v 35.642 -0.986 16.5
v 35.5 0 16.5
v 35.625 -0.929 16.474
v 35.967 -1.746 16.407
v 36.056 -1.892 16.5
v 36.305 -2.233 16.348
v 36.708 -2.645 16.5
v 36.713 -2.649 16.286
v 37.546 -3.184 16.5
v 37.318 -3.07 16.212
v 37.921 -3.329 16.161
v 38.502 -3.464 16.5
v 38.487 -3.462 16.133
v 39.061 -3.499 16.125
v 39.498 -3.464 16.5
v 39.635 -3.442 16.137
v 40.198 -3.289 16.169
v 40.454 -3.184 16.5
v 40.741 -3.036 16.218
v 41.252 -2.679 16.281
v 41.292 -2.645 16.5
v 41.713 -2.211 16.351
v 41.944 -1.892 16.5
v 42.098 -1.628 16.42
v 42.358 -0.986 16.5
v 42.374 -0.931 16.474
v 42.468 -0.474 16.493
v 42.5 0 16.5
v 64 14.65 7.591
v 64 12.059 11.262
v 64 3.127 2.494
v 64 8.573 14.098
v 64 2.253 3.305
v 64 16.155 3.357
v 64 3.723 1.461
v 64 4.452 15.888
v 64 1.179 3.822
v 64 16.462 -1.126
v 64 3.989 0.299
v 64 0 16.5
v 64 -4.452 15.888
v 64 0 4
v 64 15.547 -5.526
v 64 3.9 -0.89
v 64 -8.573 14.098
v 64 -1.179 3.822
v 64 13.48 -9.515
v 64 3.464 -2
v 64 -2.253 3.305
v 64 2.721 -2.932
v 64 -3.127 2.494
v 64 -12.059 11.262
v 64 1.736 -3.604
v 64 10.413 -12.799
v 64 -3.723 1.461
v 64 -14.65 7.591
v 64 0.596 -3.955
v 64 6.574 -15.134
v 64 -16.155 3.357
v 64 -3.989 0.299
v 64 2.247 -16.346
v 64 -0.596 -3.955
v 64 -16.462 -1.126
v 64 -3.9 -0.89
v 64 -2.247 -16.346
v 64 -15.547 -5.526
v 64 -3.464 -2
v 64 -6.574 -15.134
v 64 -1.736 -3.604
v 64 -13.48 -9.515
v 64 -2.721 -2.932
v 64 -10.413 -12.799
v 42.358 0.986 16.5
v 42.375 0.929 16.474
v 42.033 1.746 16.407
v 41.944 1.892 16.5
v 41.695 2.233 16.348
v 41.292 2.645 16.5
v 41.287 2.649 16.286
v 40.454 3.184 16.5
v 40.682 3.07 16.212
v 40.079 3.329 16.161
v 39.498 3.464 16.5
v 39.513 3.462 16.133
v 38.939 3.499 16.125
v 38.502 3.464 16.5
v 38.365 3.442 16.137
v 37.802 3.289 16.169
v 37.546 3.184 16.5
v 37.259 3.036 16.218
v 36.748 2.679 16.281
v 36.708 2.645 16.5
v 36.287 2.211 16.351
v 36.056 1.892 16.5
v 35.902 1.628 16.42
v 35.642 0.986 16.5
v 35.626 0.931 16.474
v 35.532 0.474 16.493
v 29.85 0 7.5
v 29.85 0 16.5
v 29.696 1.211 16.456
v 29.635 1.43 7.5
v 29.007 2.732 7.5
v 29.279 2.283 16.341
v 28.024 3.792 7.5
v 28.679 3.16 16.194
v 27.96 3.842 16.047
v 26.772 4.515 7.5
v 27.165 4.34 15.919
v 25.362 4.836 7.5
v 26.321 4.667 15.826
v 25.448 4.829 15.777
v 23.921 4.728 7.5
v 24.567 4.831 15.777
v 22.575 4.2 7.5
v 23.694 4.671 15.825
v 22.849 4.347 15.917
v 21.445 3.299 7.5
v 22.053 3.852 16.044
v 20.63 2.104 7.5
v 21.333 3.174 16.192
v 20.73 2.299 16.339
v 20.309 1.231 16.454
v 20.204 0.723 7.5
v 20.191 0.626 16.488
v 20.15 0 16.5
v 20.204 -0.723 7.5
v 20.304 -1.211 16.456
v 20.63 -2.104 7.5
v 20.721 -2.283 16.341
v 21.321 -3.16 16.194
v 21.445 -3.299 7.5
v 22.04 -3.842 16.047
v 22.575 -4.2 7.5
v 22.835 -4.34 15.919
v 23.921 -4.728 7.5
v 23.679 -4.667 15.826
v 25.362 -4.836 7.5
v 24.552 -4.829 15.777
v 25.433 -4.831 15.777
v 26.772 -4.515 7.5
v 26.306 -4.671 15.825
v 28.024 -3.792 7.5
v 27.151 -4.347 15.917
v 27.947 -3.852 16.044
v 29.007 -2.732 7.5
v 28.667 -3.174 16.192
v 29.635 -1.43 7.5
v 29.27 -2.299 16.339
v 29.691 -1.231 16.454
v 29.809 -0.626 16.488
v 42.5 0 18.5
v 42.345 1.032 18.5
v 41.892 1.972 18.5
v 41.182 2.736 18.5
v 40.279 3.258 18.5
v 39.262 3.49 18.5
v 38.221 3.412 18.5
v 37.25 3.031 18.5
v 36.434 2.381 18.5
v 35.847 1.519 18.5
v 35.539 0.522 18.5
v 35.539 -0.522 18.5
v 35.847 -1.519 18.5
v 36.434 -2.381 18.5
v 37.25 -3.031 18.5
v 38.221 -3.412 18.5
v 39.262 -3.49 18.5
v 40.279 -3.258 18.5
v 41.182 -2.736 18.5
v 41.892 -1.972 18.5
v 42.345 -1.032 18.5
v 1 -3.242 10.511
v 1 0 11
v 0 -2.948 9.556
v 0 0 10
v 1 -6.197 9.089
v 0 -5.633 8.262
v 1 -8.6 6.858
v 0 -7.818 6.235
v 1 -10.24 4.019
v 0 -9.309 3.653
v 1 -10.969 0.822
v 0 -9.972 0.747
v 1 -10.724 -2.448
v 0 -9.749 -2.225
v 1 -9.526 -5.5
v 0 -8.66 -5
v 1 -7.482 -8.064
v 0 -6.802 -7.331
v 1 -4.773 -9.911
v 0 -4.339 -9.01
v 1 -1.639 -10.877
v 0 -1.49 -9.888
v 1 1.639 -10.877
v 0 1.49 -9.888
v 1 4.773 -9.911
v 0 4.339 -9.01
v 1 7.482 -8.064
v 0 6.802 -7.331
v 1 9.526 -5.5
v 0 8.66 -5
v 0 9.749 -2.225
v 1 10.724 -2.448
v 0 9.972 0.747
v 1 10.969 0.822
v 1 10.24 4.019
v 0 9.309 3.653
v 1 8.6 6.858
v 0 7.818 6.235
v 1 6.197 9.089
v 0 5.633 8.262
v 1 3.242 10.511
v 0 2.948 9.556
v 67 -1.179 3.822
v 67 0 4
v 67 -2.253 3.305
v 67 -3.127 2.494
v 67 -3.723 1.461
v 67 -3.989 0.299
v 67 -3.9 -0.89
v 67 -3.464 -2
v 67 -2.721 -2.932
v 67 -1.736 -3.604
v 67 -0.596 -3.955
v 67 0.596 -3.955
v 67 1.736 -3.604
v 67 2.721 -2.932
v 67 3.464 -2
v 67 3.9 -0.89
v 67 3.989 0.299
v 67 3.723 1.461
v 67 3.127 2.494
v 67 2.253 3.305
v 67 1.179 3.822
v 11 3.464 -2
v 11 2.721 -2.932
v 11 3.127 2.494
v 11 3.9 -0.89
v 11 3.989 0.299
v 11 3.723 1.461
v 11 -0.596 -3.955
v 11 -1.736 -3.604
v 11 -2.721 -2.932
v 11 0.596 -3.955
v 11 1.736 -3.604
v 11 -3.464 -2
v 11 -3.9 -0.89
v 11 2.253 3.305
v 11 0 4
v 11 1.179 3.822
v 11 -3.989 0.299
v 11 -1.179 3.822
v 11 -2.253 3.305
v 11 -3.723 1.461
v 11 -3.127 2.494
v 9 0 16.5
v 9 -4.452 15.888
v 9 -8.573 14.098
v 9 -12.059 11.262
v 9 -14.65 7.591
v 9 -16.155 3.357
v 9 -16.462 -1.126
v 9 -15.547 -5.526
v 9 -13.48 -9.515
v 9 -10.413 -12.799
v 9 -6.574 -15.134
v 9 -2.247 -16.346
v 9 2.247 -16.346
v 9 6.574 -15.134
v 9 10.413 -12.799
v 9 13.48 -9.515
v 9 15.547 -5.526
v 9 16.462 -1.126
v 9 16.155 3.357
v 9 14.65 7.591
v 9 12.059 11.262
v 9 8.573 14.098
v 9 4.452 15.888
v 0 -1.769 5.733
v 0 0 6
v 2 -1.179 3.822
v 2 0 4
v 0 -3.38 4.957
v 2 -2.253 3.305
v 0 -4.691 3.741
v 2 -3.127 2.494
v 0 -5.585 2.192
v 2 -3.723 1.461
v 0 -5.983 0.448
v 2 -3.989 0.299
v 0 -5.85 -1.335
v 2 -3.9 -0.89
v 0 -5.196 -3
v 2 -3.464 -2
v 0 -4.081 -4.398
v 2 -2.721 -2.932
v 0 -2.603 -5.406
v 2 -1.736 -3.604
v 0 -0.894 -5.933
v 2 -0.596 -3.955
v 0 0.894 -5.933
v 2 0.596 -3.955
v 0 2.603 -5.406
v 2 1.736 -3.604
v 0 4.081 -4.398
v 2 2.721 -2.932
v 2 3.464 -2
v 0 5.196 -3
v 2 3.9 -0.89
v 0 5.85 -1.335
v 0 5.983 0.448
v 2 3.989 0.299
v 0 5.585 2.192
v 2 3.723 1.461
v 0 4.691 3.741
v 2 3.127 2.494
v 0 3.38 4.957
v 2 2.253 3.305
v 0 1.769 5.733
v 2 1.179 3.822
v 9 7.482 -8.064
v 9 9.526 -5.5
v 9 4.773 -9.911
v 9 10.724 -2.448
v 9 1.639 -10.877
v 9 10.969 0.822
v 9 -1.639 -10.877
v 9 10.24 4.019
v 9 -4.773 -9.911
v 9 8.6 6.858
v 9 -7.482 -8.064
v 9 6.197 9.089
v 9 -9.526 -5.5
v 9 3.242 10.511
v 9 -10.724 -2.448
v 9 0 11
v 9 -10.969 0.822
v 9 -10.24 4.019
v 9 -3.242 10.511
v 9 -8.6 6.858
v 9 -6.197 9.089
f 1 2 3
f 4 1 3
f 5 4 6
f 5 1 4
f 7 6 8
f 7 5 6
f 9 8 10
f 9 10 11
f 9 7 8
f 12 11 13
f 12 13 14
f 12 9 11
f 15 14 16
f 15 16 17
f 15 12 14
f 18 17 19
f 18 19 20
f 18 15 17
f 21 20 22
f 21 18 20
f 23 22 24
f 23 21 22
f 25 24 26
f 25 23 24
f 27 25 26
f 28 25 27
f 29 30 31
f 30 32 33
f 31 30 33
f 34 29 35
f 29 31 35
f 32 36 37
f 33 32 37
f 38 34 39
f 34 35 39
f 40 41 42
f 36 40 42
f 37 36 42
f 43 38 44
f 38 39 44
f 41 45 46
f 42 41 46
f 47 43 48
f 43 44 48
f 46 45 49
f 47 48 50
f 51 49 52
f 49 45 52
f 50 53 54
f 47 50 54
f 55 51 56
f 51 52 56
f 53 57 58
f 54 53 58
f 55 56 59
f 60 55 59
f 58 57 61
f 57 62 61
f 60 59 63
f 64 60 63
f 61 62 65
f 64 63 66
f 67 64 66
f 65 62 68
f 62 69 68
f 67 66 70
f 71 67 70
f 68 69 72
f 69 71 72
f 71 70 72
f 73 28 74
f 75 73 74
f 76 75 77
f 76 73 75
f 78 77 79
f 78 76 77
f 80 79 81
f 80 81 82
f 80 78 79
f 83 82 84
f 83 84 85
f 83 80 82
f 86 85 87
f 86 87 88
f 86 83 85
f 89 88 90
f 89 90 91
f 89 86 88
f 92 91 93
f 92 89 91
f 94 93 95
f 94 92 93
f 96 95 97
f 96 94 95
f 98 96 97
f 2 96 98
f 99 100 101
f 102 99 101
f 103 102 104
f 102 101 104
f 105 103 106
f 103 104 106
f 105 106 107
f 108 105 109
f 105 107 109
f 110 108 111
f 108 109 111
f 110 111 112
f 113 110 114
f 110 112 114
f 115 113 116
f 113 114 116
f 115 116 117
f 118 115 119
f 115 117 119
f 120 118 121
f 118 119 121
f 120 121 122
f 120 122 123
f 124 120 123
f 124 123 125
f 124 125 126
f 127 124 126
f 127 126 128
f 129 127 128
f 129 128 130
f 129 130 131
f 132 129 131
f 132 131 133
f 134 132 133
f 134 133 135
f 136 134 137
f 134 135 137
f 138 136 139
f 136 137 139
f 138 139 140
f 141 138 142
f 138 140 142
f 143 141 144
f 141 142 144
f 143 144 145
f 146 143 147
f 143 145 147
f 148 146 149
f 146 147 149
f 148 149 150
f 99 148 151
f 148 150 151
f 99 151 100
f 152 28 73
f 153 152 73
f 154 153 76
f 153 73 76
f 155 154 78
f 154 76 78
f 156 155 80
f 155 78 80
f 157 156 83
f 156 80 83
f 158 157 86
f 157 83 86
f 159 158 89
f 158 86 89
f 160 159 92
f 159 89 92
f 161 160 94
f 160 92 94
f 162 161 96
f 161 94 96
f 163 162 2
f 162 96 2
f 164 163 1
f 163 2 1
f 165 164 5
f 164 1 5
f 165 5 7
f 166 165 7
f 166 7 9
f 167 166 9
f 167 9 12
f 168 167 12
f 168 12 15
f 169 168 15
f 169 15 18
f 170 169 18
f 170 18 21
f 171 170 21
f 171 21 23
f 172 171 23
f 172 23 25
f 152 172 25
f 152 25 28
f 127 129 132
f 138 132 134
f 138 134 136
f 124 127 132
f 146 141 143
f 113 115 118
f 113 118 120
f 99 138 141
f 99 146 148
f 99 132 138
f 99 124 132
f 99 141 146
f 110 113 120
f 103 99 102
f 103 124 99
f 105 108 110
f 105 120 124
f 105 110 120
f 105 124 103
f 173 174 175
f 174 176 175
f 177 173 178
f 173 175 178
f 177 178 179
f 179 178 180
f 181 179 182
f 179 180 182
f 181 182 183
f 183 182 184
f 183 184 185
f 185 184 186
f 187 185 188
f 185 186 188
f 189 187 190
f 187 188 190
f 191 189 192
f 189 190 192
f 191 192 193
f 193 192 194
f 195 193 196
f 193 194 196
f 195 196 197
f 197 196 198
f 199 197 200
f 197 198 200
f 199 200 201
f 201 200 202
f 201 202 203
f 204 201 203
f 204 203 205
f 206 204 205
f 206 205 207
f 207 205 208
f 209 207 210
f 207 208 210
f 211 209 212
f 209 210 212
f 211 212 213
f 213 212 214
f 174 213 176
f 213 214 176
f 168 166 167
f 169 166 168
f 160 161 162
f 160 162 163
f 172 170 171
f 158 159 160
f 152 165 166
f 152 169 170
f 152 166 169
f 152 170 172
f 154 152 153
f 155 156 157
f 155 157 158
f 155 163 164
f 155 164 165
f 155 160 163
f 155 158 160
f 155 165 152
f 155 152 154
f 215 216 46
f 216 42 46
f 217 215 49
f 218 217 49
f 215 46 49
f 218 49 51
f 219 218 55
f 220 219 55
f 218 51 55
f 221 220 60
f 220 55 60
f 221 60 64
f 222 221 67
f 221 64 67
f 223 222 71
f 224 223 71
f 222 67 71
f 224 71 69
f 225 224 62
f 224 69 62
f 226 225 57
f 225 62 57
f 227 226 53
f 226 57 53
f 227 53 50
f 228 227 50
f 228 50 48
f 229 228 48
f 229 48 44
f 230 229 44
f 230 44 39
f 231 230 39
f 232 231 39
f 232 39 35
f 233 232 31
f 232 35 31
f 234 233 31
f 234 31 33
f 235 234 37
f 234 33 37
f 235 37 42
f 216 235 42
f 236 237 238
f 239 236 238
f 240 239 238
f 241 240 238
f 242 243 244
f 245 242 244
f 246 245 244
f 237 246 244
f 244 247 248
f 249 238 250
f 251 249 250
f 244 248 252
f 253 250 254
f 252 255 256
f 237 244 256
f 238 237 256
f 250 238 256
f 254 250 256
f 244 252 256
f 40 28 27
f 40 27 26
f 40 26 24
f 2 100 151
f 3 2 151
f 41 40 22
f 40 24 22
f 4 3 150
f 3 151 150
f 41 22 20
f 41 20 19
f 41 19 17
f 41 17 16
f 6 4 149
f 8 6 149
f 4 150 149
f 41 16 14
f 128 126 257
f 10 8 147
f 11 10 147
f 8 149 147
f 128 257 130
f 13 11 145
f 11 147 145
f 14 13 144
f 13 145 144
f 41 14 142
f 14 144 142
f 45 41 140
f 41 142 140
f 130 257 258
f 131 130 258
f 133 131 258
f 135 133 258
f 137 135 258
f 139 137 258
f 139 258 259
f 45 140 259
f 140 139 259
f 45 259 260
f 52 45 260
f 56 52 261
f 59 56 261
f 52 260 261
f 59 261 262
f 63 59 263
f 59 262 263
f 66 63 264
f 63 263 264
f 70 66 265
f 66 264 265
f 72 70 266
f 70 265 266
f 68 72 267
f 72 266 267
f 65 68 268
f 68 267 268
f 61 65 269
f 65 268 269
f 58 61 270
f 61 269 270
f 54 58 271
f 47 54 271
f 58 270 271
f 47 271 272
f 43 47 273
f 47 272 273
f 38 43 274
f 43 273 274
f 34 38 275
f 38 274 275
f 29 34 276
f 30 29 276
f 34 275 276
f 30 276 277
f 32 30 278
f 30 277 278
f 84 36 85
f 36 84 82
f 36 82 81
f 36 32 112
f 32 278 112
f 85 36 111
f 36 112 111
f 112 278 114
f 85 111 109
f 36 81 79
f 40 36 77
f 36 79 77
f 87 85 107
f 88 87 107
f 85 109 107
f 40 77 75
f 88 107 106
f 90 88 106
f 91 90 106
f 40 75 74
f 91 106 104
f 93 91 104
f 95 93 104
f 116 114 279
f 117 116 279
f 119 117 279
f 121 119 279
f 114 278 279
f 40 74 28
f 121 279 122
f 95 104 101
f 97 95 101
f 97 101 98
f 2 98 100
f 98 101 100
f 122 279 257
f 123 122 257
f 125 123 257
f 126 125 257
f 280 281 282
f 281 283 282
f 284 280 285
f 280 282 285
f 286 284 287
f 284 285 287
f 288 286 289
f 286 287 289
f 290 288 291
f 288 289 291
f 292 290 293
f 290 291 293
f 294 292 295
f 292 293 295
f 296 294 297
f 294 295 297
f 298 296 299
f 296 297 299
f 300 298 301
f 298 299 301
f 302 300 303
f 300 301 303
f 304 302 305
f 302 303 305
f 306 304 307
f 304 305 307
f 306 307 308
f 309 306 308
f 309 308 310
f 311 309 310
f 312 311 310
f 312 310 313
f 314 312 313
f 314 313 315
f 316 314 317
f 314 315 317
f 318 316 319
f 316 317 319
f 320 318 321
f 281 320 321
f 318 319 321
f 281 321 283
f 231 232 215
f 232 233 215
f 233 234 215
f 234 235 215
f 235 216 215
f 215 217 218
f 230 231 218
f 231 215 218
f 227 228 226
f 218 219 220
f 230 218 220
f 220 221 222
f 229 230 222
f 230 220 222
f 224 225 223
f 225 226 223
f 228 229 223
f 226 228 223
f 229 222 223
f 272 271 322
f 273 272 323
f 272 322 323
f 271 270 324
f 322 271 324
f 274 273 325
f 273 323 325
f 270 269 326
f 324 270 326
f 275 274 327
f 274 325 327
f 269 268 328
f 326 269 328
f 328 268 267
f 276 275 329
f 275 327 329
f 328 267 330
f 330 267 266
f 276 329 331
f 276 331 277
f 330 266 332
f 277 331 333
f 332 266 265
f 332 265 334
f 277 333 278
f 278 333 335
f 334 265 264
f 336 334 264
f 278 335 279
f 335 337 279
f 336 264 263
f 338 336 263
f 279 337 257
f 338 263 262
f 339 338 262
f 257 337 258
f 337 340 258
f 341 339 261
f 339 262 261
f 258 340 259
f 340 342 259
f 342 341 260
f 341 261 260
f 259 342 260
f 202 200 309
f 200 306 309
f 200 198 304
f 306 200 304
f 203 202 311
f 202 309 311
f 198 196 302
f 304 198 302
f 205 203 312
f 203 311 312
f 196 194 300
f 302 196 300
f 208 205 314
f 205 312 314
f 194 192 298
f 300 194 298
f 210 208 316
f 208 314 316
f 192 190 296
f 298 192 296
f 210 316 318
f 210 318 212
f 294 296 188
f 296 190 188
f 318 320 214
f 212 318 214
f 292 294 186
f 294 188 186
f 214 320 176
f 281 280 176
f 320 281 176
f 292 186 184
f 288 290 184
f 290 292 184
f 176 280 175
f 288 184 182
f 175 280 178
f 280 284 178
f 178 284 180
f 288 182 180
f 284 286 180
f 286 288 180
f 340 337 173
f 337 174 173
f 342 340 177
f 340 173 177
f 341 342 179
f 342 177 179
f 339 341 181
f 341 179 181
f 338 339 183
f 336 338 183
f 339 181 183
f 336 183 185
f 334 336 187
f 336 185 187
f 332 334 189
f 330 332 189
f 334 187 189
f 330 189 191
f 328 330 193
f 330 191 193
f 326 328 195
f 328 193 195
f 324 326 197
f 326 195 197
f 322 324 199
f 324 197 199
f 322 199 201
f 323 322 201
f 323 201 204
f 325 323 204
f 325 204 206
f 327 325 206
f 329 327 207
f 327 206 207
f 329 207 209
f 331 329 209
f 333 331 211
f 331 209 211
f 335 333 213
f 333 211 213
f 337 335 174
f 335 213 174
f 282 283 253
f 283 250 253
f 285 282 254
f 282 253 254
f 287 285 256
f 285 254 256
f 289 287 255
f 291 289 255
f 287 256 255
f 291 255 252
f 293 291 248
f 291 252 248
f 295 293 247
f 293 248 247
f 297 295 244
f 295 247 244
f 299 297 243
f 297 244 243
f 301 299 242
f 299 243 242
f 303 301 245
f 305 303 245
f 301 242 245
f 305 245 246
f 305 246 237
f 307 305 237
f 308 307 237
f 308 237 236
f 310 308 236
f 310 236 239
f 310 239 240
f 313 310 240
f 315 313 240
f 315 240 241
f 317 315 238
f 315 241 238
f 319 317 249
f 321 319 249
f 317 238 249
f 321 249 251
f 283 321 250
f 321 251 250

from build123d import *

# Parameters (mm, degrees)
SKETCH2_R                            = 4.85
CUT_EXTRUDE1_DEPTH                   = 9
SKETCH3_R                            = 3.5
BOSS_EXTRUDE1_DEPTH                  = 2
BOSS_EXTRUDE1_DIRECTION_2_REACH      = 78.487
BOSS_EXTRUDE1_DIRECTION_2_END_RADIUS = 16.5


with BuildPart() as part:
    # Sketch1 → Revolve1 (revolve)
    with BuildSketch(Plane(origin=(0, 0, 0), x_dir=(1, 0, 0), z_dir=(0, 1, 0)), mode=Mode.PRIVATE) as revolve1_sk:
        Polygon((0, 10), (0, 6), (2, 4), (11, 4), (11, 0), (67, 0), (67, 4), (64, 4), (64, 16.5), (9, 16.5), (9, 11), (1, 11), align=None)
    revolve(revolve1_sk.sketch.rotate(Axis((0, 0, 0), (1, 0, 0)), 180), axis=Axis((0, 0, 0), (1, 0, 0)))

    # Sketch2 → Cut-Extrude1 (cut)
    with BuildSketch(Plane.XY.offset(16.5)):
        with Locations((25, 0)):
            Circle(SKETCH2_R)
    extrude(amount=-CUT_EXTRUDE1_DEPTH, mode=Mode.SUBTRACT)


with BuildPart() as boss_extrude1_tool:
    # Sketch3 → Boss-Extrude1 (new body)
    with BuildSketch(Plane.XY.offset(16.5)):
        with Locations((39, 0)):
            Circle(SKETCH3_R)
    extrude(amount=BOSS_EXTRUDE1_DEPTH)


with BuildPart() as part_1:
    add(part.part)


with BuildPart() as part_2:
    # Boss-Extrude1: joined with boss_extrude1_tool
    add(part_1.part.fuse(boss_extrude1_tool.part, tol=0.00001))

    # Boss-Extrude1 direction 2: up to this cylinder (the profile starts outside it)
    boss_extrude1_direction_2_end = Plane(origin=(39, 0, 0), z_dir=(-1, 0, 0)) * Cylinder(BOSS_EXTRUDE1_DIRECTION_2_END_RADIUS, 190.974, mode=Mode.PRIVATE)
    # Sketch3 → Boss-Extrude1 direction 2 (add, up to the surface)
    with BuildSketch(Plane.XY.offset(16.5), mode=Mode.PRIVATE) as boss_extrude1_direction_2_sk1:
        with Locations((39, 0)):
            Circle(SKETCH3_R)
    boss_extrude1_direction_2_tool1 = extrude(boss_extrude1_direction_2_sk1.sketch, amount=-BOSS_EXTRUDE1_DIRECTION_2_REACH, mode=Mode.PRIVATE) - boss_extrude1_direction_2_end
    add(boss_extrude1_direction_2_tool1.solids().sort_by_distance((39, 0, 16.5))[0])
    add(boss_extrude1_direction_2_tool1.solids().sort_by_distance((39, 0, 16.5))[1])


solid = part_2.part
